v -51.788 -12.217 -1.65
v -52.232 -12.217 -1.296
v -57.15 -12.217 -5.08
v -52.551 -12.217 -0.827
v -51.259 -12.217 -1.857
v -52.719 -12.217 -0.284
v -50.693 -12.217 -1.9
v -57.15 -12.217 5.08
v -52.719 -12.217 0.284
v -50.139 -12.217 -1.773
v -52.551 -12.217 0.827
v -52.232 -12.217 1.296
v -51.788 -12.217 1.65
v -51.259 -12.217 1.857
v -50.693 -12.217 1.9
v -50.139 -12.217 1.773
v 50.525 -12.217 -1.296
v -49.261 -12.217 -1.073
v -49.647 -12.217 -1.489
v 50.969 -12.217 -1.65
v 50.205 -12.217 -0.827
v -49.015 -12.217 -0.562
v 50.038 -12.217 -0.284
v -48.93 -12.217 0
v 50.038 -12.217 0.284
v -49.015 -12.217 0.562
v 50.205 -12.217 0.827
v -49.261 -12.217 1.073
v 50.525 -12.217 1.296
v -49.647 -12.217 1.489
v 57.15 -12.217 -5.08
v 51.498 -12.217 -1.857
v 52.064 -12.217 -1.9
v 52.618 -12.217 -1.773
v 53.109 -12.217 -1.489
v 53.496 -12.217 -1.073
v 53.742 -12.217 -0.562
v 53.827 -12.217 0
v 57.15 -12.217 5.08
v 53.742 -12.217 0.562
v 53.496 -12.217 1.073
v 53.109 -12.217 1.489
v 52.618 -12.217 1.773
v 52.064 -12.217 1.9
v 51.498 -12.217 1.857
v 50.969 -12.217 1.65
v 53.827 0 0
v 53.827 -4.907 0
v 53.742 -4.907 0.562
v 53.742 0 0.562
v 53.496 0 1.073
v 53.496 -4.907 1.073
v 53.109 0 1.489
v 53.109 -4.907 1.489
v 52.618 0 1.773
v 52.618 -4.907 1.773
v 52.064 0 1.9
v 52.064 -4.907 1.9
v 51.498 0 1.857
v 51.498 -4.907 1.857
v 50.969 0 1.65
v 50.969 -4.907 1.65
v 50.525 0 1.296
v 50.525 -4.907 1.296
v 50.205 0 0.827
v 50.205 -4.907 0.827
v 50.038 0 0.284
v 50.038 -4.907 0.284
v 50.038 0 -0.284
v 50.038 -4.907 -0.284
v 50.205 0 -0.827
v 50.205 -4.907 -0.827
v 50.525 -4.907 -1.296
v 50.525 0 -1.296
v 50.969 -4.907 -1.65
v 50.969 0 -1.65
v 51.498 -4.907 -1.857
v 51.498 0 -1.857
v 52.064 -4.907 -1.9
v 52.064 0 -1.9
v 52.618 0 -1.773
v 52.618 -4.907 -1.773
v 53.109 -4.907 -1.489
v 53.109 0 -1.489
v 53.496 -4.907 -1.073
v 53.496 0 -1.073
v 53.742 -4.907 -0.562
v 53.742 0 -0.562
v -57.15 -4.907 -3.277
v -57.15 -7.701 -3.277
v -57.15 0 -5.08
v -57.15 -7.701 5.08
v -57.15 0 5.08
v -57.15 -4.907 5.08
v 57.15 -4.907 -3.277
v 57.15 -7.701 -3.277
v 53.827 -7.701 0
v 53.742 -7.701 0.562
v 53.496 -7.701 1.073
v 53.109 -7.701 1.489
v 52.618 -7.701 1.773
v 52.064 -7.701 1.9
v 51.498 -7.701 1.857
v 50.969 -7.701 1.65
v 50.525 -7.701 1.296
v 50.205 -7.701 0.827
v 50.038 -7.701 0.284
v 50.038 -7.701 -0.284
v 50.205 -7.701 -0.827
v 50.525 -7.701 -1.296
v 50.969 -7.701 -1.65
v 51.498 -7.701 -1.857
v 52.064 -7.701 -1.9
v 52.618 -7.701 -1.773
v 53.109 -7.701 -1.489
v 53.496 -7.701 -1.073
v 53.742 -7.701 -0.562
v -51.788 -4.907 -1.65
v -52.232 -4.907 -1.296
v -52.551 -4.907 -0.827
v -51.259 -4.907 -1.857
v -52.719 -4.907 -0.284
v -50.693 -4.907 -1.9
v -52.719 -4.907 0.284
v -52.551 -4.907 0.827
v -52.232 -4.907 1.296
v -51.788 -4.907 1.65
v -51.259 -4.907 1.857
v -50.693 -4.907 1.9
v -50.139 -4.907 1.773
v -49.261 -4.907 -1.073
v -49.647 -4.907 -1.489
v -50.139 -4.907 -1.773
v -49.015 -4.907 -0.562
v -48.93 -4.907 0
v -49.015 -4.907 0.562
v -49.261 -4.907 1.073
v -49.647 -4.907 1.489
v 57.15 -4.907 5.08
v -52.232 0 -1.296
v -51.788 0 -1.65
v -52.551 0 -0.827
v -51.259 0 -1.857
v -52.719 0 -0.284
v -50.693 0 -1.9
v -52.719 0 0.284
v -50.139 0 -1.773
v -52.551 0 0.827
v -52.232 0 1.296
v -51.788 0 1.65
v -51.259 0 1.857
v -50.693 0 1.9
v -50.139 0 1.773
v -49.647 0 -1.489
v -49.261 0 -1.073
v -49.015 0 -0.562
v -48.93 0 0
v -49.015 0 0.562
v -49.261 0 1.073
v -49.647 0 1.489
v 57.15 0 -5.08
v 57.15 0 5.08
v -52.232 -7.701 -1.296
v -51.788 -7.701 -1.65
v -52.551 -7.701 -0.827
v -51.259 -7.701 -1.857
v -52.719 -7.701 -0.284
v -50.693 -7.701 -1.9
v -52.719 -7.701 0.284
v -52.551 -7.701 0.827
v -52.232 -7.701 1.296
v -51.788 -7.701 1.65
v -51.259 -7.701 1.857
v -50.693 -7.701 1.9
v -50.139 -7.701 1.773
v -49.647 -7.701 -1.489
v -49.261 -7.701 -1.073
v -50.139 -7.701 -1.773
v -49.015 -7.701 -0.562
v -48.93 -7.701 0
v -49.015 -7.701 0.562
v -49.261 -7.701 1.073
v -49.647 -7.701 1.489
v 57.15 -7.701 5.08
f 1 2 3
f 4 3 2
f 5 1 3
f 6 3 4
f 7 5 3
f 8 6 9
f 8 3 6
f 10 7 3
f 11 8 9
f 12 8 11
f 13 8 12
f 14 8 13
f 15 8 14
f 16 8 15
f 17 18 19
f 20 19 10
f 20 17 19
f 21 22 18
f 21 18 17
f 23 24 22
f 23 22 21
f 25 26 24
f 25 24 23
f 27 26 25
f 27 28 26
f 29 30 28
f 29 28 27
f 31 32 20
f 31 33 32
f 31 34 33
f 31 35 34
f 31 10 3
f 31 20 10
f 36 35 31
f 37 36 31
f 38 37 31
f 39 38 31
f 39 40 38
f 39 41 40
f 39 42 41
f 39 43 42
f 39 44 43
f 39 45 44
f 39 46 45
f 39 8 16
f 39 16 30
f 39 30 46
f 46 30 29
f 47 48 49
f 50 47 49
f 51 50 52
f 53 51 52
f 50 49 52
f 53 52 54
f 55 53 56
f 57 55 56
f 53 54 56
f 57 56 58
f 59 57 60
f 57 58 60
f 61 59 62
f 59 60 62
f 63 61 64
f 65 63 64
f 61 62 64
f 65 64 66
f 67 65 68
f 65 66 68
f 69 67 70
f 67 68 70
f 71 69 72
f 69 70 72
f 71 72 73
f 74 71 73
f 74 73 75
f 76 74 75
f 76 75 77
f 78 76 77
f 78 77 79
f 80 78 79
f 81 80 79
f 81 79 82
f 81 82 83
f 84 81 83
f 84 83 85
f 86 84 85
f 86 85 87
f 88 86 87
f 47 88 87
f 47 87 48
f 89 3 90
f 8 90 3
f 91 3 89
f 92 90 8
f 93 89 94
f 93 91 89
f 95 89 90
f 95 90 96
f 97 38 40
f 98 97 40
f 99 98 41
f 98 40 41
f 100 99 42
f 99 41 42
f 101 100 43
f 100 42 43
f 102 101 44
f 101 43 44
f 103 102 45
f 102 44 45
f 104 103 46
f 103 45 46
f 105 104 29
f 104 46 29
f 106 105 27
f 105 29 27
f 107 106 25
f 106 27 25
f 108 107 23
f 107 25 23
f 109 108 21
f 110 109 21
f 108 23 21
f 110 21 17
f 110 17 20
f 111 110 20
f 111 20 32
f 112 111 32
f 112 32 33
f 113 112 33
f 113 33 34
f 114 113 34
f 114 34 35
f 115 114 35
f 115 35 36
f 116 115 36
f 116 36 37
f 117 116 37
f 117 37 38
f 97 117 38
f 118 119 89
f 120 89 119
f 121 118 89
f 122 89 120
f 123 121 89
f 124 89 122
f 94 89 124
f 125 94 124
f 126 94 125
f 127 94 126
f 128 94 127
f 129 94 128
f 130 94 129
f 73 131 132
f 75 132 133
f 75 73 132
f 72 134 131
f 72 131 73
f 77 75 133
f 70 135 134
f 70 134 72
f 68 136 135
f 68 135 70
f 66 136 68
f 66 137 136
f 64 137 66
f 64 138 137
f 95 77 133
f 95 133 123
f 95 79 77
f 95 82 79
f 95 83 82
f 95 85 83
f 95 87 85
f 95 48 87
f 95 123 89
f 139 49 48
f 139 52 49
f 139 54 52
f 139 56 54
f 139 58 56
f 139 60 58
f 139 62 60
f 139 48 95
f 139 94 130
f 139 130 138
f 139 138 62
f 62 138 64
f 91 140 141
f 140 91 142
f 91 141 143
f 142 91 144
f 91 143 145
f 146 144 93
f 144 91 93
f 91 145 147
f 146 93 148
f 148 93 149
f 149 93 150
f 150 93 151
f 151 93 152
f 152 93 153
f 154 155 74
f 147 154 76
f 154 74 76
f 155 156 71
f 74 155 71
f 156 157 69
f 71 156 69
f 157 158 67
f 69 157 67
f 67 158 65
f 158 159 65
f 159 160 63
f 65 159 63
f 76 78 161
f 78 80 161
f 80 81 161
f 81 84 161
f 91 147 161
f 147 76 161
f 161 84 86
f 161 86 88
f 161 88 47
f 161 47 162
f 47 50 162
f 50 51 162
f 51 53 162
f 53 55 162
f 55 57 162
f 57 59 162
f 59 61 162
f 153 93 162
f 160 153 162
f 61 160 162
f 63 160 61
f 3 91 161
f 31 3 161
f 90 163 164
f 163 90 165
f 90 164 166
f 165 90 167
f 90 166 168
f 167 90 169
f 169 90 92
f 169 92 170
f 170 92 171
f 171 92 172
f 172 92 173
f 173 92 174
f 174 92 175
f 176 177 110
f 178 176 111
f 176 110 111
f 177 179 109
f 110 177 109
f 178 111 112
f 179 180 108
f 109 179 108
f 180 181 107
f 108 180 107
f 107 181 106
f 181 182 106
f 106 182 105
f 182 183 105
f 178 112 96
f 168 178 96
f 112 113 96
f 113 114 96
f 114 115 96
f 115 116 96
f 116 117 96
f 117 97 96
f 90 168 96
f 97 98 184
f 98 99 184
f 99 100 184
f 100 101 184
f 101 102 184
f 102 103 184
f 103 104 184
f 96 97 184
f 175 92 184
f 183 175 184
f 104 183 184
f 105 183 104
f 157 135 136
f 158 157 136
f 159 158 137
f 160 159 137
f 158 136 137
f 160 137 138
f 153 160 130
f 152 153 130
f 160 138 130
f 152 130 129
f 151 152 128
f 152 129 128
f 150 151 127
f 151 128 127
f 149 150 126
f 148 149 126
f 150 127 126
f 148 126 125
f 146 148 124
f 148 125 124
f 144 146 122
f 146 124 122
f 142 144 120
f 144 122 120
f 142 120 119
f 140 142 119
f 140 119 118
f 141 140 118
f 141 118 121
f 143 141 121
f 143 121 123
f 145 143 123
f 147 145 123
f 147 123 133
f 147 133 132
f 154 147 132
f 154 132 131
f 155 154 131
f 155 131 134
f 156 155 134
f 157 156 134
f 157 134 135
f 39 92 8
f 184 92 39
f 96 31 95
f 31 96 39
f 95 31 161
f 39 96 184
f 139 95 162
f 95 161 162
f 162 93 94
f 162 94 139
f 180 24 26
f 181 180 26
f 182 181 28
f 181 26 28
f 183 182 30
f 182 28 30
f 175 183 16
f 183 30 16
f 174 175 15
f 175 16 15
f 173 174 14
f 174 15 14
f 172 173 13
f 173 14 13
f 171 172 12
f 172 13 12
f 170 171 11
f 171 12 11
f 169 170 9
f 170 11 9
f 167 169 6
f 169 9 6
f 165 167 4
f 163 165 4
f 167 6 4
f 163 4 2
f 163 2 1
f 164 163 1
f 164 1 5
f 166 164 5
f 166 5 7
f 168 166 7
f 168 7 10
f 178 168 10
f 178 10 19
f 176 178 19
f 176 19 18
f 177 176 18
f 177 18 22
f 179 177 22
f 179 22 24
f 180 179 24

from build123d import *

# Parameters (mm, degrees)
F0_W     = 114.3
F0_H     = 10.16
F1_DEPTH = 12.2174
F2_W     = 114.3
F2_H     = 2.794
F3_DEPTH = 8.3566
F4_R     = 1.905
F5_DEPTH = 25.4


with BuildPart() as f1:
    # F0 (on Front) → F1 (new body)
    with BuildSketch(Plane.XZ):
        Rectangle(F0_W, F0_H)
    extrude(amount=F1_DEPTH)

    # F2 (on face) → F3 (cut)
    with BuildSketch(Plane.XY.offset(5.08)):
        with Locations((0, -6.303842)):
            Rectangle(F2_W, F2_H)
    extrude(amount=-F3_DEPTH, mode=Mode.SUBTRACT)

    # F4 (on face) → F5 (cut)
    with BuildSketch(Plane.XZ.offset(12.2174)):
        with Locations((-50.835151, 0)):
            Circle(F4_R)
        with Locations((51.921636, 0)):
            Circle(F4_R)
    extrude(amount=-F5_DEPTH, mode=Mode.SUBTRACT)


solid = f1.part
